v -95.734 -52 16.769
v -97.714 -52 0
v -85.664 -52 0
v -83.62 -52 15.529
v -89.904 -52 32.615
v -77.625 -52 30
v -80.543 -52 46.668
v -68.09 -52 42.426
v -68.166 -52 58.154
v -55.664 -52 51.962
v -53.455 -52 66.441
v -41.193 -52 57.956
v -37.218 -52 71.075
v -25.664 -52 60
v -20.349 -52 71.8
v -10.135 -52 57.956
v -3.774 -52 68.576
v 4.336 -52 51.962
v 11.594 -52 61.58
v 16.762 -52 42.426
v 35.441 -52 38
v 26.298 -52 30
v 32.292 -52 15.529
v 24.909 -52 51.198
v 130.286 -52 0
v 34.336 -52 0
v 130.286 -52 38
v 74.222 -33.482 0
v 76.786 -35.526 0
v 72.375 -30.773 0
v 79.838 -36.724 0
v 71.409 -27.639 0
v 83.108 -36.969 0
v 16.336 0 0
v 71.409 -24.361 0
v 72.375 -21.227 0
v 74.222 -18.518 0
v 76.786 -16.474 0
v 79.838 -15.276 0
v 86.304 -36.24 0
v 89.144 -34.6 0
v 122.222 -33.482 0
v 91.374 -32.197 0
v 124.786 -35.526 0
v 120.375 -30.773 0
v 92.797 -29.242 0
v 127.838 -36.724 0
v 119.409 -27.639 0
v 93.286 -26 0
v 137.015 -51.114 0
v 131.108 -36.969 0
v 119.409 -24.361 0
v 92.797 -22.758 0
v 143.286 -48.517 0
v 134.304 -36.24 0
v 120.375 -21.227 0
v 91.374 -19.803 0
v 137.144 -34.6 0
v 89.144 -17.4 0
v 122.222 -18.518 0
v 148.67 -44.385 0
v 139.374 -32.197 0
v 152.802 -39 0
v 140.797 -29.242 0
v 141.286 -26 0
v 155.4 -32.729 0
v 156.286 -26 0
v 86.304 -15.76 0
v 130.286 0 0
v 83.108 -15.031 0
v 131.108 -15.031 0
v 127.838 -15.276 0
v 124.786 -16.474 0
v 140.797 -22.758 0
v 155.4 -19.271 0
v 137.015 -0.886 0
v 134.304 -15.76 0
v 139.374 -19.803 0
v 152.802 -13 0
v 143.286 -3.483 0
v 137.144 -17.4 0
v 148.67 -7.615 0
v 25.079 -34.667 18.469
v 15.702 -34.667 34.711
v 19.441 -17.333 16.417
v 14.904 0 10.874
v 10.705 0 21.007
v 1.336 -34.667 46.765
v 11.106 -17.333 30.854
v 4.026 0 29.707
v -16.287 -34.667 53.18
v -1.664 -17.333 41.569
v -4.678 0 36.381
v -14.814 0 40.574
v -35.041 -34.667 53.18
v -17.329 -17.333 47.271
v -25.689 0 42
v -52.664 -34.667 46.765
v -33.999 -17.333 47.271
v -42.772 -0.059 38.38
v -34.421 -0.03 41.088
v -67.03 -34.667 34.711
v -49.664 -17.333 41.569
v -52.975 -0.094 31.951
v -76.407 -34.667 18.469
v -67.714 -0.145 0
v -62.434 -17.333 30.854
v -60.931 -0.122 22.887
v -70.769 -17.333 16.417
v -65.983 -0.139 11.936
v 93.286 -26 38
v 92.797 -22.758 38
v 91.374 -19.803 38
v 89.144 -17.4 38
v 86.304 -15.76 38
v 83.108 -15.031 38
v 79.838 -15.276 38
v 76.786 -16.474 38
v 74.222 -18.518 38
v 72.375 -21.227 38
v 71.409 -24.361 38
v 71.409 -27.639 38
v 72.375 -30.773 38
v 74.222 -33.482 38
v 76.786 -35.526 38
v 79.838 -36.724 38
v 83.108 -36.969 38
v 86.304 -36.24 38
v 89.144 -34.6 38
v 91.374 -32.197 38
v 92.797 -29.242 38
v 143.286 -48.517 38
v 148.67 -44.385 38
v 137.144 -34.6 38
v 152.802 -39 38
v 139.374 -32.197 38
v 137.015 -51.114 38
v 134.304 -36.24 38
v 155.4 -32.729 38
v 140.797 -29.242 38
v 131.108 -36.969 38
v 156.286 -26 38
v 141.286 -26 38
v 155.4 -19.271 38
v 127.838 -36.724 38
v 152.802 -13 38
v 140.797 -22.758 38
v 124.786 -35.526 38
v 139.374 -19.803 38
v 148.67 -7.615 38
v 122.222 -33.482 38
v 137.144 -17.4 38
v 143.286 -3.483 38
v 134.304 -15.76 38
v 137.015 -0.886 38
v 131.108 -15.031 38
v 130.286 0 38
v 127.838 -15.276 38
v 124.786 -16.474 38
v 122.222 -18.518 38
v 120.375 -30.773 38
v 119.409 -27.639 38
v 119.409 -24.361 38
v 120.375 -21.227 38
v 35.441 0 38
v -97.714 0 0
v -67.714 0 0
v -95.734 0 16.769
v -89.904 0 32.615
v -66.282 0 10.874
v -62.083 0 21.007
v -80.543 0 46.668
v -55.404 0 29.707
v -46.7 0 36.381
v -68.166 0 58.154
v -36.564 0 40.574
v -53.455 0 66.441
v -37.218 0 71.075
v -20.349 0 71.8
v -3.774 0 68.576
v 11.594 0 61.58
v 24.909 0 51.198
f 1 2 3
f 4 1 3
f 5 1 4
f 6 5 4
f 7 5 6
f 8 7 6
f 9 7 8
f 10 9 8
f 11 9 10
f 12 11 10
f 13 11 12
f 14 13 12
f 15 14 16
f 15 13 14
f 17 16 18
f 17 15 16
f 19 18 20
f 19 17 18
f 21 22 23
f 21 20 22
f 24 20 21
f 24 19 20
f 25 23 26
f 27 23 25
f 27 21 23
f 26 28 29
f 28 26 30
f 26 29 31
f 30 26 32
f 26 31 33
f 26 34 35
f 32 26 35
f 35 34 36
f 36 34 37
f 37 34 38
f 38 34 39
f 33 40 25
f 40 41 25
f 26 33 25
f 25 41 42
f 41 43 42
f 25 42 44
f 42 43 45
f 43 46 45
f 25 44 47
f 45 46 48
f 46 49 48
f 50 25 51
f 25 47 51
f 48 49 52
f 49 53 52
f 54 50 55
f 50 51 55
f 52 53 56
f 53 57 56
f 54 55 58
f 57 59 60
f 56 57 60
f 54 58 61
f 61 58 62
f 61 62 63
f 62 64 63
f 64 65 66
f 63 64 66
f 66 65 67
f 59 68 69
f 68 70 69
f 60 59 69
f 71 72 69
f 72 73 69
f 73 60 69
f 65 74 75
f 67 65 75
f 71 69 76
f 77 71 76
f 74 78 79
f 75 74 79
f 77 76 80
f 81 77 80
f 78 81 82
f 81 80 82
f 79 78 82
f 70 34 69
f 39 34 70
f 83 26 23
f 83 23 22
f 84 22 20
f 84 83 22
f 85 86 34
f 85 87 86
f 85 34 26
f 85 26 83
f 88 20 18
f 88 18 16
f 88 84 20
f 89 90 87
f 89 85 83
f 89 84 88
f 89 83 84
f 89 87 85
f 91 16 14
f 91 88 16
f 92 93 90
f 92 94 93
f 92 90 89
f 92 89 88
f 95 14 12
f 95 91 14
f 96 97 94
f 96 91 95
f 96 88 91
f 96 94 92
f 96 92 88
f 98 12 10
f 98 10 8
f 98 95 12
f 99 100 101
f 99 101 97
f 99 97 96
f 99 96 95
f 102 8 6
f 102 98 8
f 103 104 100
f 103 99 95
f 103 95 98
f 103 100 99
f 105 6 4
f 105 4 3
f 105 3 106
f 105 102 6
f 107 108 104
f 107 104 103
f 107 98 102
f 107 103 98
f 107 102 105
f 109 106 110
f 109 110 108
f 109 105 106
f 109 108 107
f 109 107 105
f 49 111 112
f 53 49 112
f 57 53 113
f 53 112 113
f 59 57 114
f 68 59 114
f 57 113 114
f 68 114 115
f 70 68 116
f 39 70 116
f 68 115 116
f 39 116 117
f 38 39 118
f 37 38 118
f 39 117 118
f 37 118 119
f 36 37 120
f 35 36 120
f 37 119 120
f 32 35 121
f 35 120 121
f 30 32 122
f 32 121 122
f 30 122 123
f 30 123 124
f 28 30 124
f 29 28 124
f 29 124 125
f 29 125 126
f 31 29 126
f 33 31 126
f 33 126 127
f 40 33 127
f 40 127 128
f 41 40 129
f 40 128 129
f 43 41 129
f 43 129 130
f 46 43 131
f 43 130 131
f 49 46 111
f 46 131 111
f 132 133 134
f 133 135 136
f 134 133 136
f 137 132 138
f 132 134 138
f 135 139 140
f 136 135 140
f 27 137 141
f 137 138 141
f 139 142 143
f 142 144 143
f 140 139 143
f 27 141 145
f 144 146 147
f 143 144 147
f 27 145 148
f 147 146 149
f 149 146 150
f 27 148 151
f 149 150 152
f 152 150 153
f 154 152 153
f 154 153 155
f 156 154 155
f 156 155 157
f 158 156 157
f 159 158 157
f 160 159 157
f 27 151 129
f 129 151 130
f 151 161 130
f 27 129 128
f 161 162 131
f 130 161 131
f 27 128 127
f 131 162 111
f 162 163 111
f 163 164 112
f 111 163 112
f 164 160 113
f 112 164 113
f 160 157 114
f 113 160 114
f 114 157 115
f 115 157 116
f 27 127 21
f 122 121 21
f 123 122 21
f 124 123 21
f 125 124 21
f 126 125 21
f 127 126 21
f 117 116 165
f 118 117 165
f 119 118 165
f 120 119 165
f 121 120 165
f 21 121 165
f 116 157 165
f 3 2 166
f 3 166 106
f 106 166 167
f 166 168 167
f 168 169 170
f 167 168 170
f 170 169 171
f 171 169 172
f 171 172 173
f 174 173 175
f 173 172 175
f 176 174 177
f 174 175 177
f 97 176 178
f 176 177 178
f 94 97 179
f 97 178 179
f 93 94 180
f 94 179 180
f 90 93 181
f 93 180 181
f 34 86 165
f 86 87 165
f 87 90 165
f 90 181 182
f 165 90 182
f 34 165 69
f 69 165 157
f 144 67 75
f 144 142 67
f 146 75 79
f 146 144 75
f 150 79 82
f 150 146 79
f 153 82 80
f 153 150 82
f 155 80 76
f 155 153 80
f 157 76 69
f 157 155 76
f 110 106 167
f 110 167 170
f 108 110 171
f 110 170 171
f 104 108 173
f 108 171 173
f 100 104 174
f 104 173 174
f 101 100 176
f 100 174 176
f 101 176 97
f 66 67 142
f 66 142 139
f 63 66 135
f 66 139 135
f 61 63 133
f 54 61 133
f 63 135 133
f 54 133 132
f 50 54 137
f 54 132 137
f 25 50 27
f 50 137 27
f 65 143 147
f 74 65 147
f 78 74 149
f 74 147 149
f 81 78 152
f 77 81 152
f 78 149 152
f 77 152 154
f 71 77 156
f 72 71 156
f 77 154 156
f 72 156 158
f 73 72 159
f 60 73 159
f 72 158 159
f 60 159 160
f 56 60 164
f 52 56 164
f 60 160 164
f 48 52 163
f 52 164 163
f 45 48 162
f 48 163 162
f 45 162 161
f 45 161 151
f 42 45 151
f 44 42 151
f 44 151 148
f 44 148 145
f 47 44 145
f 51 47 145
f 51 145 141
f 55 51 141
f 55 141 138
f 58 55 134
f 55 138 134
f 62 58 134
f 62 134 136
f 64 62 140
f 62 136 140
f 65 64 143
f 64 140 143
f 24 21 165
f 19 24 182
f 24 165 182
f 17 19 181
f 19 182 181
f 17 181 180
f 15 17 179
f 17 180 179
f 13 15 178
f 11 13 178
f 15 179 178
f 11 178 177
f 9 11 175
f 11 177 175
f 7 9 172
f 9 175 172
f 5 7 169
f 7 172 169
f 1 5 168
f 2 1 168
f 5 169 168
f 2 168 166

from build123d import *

# Parameters (mm, degrees)
F1_DEPTH = 52
F3_R     = 25.99999
F2_R     = 11
F4_DEPTH = 38
F5_DEPTH = 38


# Not quite as in the source:
# - a fillet or chamfer is up to 0.001 mm smaller than in the source, because OpenCascade refuses the exact size


with BuildPart() as f1:
    # F0 (on Front) → F1 (new body)
    with BuildSketch(Plane.XZ):
        with BuildLine():
            Line((46.2857175011, 0), (156.2857175011, 0))
            Line((156.2857175011, 0), (156.2857175011, 38))
            Line((156.2857175011, 38), (35.4412569068, 38))
            ThreePointArc((35.4412569068, 38), (-45.4728396677, 69.2358246763), (-97.7142824989, 0))
            Line((-97.7142824989, 0), (-67.7142824989, 0))
            ThreePointArc((-67.7142824989, 0), (-25.7142824989, 42), (16.2857175011, 0))
            Line((16.2857175011, 0), (46.2857175011, 0))
        make_face()
    extrude(amount=F1_DEPTH)

    # F3 (radius 26 in the source; OpenCascade refuses exactly that, so slightly less here)
    f3_edges = [f1.edges().sort_by_distance(p)[0] for p in [
        (156.285718, 0, 19),
        (156.285718, -52, 19),
    ]]
    fillet(f3_edges, radius=F3_R)

    # F2 (on face) → F4 (cut)
    with BuildSketch(Plane.XY.offset(38)):
        with Locations((130.2857175011, -26)):
            Circle(F2_R)
    extrude(amount=-F4_DEPTH, mode=Mode.SUBTRACT)

    # F2 (on face) → F5 (cut)
    with BuildSketch(Plane.XY.offset(38)):
        with Locations((82.2857175011, -26)):
            Circle(F2_R)
    extrude(amount=-F5_DEPTH, mode=Mode.SUBTRACT)

    # F6 (on face) → F7 (revolve, cut)
    with BuildSketch(Plane(origin=(0, 0, 0), x_dir=(1, 0, 0), z_dir=(0, 0, -1))):
        Polygon((-25.6639542129, 52), (-85.6639542129, 52), (-67.6639542129, 0), (-25.6639542129, 0), align=None)
    revolve(axis=Axis((-25.6639542129, -26, 0), (0, -1, 0)), mode=Mode.SUBTRACT)


solid = f1.part
